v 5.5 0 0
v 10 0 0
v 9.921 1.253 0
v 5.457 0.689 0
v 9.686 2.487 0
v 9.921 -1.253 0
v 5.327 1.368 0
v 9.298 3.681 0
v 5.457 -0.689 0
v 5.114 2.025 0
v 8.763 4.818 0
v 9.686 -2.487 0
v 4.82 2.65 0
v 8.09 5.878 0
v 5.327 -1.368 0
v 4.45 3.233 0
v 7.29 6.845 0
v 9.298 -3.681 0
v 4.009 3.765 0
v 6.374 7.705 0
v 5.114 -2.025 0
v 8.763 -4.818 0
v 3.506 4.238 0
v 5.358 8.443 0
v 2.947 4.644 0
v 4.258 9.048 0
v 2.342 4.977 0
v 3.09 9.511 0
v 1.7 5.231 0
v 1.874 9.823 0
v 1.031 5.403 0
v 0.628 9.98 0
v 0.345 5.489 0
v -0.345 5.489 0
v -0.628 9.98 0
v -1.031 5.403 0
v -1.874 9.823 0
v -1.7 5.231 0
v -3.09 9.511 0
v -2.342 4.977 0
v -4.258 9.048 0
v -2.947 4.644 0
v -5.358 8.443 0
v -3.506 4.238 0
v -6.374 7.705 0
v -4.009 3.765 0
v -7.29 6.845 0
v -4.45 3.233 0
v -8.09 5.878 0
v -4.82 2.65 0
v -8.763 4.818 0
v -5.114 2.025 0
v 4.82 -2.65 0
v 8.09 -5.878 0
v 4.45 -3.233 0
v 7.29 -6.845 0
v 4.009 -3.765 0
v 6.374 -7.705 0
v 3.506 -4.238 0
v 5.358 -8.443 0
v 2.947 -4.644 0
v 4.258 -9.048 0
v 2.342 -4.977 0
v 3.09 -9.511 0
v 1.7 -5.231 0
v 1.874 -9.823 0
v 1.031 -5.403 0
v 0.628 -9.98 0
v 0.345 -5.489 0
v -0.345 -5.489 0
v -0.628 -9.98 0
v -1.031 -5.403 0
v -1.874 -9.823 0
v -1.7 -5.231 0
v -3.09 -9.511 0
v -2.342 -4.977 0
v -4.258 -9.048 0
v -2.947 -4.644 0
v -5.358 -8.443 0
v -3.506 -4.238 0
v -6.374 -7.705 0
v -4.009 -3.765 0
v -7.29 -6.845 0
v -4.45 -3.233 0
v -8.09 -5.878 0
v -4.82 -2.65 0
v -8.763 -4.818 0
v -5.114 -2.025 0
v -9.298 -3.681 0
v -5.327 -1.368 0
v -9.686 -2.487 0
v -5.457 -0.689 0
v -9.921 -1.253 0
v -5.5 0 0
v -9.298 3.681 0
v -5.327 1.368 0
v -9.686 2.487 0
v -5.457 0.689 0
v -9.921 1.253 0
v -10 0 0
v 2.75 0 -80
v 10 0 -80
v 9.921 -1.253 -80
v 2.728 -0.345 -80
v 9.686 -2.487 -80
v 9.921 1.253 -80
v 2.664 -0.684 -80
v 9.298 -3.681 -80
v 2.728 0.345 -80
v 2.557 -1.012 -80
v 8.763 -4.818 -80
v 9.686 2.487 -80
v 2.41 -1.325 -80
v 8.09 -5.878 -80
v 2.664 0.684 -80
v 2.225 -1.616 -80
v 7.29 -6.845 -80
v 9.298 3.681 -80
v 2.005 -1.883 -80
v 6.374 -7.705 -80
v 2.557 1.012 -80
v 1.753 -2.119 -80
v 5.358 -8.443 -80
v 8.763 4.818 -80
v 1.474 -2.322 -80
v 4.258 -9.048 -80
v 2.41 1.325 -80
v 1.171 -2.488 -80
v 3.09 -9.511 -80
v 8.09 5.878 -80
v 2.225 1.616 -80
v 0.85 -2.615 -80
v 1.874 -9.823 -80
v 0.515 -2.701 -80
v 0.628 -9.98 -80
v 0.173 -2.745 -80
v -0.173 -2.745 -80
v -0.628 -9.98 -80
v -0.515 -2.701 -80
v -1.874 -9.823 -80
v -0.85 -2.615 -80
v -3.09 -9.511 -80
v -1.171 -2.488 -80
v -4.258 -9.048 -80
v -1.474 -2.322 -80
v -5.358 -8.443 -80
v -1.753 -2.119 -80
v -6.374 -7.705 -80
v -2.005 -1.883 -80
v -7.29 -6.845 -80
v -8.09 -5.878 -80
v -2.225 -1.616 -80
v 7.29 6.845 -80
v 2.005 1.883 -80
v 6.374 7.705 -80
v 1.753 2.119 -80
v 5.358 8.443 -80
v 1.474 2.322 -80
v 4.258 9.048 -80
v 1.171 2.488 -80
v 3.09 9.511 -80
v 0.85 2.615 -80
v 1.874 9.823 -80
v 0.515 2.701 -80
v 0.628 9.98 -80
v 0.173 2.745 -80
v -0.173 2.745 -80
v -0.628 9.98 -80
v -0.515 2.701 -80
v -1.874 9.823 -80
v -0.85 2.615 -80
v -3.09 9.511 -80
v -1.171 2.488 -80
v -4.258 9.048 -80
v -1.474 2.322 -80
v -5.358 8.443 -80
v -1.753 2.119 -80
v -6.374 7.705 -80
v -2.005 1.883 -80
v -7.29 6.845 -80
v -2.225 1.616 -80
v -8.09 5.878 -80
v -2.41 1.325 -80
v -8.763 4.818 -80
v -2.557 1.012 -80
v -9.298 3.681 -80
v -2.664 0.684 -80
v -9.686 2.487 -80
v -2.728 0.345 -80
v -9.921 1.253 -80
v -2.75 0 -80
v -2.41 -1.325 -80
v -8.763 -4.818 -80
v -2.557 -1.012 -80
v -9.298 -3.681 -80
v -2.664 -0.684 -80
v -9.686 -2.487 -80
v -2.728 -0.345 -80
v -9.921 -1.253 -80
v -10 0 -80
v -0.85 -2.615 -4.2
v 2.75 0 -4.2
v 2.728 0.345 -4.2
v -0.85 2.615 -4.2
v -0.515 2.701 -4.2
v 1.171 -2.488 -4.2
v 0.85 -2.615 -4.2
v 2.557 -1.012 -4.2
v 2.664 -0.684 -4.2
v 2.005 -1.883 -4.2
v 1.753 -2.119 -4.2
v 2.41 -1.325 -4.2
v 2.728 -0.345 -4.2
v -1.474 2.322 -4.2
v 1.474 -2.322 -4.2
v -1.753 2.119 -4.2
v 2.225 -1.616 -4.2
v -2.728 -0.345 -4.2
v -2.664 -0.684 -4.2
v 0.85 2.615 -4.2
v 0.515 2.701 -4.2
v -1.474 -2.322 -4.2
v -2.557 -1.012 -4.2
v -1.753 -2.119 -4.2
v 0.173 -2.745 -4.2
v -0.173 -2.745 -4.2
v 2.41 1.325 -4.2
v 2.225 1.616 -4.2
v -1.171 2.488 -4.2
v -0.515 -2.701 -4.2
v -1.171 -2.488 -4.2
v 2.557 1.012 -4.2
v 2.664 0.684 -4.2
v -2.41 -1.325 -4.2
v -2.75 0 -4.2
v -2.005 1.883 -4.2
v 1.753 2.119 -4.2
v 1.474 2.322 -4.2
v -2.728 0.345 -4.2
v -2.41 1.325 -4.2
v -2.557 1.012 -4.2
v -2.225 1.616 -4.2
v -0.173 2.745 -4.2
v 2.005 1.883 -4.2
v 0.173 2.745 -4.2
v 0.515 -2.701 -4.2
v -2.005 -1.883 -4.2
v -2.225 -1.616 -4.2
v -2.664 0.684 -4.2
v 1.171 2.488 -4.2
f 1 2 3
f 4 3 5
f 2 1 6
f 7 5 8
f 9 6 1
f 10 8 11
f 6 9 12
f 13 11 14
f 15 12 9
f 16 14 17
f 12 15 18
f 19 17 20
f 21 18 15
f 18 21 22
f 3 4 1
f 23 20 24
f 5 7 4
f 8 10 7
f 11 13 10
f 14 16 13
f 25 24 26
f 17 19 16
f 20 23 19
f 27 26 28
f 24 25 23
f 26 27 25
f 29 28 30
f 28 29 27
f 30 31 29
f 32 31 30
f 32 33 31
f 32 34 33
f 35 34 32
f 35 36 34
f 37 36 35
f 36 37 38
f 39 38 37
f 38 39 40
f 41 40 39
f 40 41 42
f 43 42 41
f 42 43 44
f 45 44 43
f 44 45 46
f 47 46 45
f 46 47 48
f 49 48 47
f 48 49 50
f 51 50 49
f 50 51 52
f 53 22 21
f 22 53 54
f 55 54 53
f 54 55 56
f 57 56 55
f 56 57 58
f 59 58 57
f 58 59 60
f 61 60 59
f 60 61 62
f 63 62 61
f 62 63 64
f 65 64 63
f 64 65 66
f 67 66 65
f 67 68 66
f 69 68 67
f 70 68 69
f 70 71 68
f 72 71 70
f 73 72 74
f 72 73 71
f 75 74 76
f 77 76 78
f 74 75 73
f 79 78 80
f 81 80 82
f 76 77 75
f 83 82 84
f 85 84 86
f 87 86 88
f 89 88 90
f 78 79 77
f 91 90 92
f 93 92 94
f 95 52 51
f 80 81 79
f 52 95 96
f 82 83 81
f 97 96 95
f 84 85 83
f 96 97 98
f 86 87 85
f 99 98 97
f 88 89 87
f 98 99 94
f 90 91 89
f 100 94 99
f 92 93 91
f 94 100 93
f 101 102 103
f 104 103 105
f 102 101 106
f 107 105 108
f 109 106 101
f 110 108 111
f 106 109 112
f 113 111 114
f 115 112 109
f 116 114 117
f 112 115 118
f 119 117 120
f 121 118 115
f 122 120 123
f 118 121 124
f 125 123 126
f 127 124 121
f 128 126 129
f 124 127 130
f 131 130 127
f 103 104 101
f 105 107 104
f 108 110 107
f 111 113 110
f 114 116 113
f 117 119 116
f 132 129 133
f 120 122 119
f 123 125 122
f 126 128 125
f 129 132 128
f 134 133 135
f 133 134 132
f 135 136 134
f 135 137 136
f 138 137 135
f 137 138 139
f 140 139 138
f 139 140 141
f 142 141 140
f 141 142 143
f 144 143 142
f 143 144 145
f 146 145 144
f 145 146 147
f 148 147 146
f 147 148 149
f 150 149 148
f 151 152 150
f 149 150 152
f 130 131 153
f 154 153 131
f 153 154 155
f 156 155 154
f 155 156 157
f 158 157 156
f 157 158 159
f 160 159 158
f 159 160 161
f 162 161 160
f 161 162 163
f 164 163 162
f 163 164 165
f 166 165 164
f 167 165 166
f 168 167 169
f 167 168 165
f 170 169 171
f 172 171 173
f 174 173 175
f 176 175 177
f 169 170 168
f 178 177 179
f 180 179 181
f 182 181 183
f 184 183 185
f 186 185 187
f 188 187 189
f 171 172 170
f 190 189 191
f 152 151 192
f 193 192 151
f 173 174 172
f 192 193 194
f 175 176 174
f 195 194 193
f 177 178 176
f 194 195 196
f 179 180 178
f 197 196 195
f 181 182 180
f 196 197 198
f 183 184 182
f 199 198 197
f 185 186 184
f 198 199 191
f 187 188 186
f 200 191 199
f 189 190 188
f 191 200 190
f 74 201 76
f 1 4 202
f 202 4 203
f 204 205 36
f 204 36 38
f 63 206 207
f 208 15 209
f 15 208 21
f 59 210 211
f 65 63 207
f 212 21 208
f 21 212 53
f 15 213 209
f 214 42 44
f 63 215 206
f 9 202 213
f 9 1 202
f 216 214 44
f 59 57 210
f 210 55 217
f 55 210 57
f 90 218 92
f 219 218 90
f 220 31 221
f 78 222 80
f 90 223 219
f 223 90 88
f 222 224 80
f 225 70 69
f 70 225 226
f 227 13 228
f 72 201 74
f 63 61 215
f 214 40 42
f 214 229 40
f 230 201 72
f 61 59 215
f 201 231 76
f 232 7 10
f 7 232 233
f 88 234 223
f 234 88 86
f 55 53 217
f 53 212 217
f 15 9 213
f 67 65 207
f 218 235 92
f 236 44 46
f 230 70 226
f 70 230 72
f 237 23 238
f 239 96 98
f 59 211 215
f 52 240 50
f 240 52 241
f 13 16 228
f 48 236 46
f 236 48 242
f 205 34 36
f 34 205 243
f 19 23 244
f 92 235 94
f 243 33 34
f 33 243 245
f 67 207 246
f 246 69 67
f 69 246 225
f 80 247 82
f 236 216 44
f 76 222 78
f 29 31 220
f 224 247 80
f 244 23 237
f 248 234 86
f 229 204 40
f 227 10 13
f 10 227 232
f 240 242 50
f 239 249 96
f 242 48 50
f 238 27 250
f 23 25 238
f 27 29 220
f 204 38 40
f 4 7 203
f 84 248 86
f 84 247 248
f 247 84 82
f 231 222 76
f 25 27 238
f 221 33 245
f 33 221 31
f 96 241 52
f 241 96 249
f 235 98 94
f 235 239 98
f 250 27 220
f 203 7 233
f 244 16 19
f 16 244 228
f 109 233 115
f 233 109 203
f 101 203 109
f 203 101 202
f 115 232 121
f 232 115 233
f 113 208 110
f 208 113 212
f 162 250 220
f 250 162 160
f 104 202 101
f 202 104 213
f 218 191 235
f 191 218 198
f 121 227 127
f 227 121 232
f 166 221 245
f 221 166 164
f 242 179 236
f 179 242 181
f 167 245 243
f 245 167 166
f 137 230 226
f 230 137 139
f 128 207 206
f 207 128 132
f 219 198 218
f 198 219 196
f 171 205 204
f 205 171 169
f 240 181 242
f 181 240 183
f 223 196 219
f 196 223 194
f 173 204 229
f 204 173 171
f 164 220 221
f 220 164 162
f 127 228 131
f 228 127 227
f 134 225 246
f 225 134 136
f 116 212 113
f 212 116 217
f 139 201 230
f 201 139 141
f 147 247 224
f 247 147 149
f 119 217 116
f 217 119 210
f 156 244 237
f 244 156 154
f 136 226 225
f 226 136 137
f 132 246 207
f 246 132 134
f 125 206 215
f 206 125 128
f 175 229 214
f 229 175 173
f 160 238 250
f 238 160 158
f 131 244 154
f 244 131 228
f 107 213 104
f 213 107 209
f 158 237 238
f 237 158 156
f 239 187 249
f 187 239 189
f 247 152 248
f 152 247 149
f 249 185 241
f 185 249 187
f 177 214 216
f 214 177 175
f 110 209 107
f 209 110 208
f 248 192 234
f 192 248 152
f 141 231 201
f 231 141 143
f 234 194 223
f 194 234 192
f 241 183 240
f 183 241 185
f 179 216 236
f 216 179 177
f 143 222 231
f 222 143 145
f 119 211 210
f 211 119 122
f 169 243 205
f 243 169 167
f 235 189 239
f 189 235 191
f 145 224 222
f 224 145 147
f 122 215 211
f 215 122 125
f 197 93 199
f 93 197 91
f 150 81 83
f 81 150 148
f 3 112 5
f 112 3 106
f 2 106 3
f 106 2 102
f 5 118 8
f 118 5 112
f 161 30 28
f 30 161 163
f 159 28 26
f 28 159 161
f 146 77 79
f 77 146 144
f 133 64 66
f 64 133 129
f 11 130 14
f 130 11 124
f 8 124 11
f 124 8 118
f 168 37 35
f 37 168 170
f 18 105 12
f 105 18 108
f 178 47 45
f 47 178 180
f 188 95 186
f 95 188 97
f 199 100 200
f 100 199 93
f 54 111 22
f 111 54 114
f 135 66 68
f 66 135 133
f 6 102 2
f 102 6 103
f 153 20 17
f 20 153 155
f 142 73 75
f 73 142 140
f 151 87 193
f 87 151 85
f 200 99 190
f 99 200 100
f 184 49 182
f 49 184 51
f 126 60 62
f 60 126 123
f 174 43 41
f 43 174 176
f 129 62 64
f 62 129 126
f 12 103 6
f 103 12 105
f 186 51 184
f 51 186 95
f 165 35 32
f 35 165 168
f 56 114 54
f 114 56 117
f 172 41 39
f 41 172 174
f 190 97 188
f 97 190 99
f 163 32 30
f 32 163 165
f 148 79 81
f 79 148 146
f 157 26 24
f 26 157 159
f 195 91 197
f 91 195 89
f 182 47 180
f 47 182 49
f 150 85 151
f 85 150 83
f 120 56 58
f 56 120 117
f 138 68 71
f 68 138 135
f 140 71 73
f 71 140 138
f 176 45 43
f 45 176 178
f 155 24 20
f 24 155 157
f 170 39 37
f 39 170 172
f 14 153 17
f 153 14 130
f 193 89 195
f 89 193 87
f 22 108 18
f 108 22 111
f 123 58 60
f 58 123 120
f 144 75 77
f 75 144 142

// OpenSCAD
$fn = 50;


difference() {
	union() {
		translate(v = [0, 0, -80.0000000000]) {
			cylinder(h = 80, r = 10.0000000000);
		}
		cylinder(h = 0, r = 13.0000000000);
	}
	union() {
		translate(v = [0, 0, 0]) {
			rotate(a = [0, 0, 0]) {
				difference() {
					union() {
						#translate(v = [0, 0, -80.0000000000]) {
							cylinder(h = 80, r = 2.2500000000);
						}
						#translate(v = [0, 0, -4.2000000000]) {
							cylinder(h = 4.2000000000, r = 10.0000000000, r1 = 2.7500000000, r2 = 5.5000000000);
						}
						#translate(v = [0, 0, -80.0000000000]) {
							cylinder(h = 80, r = 2.7500000000);
						}
						#translate(v = [0, 0, -80.0000000000]) {
							cylinder(h = 80, r = 2.2500000000);
						}
					}
					union();
				}
			}
		}
	}
}
